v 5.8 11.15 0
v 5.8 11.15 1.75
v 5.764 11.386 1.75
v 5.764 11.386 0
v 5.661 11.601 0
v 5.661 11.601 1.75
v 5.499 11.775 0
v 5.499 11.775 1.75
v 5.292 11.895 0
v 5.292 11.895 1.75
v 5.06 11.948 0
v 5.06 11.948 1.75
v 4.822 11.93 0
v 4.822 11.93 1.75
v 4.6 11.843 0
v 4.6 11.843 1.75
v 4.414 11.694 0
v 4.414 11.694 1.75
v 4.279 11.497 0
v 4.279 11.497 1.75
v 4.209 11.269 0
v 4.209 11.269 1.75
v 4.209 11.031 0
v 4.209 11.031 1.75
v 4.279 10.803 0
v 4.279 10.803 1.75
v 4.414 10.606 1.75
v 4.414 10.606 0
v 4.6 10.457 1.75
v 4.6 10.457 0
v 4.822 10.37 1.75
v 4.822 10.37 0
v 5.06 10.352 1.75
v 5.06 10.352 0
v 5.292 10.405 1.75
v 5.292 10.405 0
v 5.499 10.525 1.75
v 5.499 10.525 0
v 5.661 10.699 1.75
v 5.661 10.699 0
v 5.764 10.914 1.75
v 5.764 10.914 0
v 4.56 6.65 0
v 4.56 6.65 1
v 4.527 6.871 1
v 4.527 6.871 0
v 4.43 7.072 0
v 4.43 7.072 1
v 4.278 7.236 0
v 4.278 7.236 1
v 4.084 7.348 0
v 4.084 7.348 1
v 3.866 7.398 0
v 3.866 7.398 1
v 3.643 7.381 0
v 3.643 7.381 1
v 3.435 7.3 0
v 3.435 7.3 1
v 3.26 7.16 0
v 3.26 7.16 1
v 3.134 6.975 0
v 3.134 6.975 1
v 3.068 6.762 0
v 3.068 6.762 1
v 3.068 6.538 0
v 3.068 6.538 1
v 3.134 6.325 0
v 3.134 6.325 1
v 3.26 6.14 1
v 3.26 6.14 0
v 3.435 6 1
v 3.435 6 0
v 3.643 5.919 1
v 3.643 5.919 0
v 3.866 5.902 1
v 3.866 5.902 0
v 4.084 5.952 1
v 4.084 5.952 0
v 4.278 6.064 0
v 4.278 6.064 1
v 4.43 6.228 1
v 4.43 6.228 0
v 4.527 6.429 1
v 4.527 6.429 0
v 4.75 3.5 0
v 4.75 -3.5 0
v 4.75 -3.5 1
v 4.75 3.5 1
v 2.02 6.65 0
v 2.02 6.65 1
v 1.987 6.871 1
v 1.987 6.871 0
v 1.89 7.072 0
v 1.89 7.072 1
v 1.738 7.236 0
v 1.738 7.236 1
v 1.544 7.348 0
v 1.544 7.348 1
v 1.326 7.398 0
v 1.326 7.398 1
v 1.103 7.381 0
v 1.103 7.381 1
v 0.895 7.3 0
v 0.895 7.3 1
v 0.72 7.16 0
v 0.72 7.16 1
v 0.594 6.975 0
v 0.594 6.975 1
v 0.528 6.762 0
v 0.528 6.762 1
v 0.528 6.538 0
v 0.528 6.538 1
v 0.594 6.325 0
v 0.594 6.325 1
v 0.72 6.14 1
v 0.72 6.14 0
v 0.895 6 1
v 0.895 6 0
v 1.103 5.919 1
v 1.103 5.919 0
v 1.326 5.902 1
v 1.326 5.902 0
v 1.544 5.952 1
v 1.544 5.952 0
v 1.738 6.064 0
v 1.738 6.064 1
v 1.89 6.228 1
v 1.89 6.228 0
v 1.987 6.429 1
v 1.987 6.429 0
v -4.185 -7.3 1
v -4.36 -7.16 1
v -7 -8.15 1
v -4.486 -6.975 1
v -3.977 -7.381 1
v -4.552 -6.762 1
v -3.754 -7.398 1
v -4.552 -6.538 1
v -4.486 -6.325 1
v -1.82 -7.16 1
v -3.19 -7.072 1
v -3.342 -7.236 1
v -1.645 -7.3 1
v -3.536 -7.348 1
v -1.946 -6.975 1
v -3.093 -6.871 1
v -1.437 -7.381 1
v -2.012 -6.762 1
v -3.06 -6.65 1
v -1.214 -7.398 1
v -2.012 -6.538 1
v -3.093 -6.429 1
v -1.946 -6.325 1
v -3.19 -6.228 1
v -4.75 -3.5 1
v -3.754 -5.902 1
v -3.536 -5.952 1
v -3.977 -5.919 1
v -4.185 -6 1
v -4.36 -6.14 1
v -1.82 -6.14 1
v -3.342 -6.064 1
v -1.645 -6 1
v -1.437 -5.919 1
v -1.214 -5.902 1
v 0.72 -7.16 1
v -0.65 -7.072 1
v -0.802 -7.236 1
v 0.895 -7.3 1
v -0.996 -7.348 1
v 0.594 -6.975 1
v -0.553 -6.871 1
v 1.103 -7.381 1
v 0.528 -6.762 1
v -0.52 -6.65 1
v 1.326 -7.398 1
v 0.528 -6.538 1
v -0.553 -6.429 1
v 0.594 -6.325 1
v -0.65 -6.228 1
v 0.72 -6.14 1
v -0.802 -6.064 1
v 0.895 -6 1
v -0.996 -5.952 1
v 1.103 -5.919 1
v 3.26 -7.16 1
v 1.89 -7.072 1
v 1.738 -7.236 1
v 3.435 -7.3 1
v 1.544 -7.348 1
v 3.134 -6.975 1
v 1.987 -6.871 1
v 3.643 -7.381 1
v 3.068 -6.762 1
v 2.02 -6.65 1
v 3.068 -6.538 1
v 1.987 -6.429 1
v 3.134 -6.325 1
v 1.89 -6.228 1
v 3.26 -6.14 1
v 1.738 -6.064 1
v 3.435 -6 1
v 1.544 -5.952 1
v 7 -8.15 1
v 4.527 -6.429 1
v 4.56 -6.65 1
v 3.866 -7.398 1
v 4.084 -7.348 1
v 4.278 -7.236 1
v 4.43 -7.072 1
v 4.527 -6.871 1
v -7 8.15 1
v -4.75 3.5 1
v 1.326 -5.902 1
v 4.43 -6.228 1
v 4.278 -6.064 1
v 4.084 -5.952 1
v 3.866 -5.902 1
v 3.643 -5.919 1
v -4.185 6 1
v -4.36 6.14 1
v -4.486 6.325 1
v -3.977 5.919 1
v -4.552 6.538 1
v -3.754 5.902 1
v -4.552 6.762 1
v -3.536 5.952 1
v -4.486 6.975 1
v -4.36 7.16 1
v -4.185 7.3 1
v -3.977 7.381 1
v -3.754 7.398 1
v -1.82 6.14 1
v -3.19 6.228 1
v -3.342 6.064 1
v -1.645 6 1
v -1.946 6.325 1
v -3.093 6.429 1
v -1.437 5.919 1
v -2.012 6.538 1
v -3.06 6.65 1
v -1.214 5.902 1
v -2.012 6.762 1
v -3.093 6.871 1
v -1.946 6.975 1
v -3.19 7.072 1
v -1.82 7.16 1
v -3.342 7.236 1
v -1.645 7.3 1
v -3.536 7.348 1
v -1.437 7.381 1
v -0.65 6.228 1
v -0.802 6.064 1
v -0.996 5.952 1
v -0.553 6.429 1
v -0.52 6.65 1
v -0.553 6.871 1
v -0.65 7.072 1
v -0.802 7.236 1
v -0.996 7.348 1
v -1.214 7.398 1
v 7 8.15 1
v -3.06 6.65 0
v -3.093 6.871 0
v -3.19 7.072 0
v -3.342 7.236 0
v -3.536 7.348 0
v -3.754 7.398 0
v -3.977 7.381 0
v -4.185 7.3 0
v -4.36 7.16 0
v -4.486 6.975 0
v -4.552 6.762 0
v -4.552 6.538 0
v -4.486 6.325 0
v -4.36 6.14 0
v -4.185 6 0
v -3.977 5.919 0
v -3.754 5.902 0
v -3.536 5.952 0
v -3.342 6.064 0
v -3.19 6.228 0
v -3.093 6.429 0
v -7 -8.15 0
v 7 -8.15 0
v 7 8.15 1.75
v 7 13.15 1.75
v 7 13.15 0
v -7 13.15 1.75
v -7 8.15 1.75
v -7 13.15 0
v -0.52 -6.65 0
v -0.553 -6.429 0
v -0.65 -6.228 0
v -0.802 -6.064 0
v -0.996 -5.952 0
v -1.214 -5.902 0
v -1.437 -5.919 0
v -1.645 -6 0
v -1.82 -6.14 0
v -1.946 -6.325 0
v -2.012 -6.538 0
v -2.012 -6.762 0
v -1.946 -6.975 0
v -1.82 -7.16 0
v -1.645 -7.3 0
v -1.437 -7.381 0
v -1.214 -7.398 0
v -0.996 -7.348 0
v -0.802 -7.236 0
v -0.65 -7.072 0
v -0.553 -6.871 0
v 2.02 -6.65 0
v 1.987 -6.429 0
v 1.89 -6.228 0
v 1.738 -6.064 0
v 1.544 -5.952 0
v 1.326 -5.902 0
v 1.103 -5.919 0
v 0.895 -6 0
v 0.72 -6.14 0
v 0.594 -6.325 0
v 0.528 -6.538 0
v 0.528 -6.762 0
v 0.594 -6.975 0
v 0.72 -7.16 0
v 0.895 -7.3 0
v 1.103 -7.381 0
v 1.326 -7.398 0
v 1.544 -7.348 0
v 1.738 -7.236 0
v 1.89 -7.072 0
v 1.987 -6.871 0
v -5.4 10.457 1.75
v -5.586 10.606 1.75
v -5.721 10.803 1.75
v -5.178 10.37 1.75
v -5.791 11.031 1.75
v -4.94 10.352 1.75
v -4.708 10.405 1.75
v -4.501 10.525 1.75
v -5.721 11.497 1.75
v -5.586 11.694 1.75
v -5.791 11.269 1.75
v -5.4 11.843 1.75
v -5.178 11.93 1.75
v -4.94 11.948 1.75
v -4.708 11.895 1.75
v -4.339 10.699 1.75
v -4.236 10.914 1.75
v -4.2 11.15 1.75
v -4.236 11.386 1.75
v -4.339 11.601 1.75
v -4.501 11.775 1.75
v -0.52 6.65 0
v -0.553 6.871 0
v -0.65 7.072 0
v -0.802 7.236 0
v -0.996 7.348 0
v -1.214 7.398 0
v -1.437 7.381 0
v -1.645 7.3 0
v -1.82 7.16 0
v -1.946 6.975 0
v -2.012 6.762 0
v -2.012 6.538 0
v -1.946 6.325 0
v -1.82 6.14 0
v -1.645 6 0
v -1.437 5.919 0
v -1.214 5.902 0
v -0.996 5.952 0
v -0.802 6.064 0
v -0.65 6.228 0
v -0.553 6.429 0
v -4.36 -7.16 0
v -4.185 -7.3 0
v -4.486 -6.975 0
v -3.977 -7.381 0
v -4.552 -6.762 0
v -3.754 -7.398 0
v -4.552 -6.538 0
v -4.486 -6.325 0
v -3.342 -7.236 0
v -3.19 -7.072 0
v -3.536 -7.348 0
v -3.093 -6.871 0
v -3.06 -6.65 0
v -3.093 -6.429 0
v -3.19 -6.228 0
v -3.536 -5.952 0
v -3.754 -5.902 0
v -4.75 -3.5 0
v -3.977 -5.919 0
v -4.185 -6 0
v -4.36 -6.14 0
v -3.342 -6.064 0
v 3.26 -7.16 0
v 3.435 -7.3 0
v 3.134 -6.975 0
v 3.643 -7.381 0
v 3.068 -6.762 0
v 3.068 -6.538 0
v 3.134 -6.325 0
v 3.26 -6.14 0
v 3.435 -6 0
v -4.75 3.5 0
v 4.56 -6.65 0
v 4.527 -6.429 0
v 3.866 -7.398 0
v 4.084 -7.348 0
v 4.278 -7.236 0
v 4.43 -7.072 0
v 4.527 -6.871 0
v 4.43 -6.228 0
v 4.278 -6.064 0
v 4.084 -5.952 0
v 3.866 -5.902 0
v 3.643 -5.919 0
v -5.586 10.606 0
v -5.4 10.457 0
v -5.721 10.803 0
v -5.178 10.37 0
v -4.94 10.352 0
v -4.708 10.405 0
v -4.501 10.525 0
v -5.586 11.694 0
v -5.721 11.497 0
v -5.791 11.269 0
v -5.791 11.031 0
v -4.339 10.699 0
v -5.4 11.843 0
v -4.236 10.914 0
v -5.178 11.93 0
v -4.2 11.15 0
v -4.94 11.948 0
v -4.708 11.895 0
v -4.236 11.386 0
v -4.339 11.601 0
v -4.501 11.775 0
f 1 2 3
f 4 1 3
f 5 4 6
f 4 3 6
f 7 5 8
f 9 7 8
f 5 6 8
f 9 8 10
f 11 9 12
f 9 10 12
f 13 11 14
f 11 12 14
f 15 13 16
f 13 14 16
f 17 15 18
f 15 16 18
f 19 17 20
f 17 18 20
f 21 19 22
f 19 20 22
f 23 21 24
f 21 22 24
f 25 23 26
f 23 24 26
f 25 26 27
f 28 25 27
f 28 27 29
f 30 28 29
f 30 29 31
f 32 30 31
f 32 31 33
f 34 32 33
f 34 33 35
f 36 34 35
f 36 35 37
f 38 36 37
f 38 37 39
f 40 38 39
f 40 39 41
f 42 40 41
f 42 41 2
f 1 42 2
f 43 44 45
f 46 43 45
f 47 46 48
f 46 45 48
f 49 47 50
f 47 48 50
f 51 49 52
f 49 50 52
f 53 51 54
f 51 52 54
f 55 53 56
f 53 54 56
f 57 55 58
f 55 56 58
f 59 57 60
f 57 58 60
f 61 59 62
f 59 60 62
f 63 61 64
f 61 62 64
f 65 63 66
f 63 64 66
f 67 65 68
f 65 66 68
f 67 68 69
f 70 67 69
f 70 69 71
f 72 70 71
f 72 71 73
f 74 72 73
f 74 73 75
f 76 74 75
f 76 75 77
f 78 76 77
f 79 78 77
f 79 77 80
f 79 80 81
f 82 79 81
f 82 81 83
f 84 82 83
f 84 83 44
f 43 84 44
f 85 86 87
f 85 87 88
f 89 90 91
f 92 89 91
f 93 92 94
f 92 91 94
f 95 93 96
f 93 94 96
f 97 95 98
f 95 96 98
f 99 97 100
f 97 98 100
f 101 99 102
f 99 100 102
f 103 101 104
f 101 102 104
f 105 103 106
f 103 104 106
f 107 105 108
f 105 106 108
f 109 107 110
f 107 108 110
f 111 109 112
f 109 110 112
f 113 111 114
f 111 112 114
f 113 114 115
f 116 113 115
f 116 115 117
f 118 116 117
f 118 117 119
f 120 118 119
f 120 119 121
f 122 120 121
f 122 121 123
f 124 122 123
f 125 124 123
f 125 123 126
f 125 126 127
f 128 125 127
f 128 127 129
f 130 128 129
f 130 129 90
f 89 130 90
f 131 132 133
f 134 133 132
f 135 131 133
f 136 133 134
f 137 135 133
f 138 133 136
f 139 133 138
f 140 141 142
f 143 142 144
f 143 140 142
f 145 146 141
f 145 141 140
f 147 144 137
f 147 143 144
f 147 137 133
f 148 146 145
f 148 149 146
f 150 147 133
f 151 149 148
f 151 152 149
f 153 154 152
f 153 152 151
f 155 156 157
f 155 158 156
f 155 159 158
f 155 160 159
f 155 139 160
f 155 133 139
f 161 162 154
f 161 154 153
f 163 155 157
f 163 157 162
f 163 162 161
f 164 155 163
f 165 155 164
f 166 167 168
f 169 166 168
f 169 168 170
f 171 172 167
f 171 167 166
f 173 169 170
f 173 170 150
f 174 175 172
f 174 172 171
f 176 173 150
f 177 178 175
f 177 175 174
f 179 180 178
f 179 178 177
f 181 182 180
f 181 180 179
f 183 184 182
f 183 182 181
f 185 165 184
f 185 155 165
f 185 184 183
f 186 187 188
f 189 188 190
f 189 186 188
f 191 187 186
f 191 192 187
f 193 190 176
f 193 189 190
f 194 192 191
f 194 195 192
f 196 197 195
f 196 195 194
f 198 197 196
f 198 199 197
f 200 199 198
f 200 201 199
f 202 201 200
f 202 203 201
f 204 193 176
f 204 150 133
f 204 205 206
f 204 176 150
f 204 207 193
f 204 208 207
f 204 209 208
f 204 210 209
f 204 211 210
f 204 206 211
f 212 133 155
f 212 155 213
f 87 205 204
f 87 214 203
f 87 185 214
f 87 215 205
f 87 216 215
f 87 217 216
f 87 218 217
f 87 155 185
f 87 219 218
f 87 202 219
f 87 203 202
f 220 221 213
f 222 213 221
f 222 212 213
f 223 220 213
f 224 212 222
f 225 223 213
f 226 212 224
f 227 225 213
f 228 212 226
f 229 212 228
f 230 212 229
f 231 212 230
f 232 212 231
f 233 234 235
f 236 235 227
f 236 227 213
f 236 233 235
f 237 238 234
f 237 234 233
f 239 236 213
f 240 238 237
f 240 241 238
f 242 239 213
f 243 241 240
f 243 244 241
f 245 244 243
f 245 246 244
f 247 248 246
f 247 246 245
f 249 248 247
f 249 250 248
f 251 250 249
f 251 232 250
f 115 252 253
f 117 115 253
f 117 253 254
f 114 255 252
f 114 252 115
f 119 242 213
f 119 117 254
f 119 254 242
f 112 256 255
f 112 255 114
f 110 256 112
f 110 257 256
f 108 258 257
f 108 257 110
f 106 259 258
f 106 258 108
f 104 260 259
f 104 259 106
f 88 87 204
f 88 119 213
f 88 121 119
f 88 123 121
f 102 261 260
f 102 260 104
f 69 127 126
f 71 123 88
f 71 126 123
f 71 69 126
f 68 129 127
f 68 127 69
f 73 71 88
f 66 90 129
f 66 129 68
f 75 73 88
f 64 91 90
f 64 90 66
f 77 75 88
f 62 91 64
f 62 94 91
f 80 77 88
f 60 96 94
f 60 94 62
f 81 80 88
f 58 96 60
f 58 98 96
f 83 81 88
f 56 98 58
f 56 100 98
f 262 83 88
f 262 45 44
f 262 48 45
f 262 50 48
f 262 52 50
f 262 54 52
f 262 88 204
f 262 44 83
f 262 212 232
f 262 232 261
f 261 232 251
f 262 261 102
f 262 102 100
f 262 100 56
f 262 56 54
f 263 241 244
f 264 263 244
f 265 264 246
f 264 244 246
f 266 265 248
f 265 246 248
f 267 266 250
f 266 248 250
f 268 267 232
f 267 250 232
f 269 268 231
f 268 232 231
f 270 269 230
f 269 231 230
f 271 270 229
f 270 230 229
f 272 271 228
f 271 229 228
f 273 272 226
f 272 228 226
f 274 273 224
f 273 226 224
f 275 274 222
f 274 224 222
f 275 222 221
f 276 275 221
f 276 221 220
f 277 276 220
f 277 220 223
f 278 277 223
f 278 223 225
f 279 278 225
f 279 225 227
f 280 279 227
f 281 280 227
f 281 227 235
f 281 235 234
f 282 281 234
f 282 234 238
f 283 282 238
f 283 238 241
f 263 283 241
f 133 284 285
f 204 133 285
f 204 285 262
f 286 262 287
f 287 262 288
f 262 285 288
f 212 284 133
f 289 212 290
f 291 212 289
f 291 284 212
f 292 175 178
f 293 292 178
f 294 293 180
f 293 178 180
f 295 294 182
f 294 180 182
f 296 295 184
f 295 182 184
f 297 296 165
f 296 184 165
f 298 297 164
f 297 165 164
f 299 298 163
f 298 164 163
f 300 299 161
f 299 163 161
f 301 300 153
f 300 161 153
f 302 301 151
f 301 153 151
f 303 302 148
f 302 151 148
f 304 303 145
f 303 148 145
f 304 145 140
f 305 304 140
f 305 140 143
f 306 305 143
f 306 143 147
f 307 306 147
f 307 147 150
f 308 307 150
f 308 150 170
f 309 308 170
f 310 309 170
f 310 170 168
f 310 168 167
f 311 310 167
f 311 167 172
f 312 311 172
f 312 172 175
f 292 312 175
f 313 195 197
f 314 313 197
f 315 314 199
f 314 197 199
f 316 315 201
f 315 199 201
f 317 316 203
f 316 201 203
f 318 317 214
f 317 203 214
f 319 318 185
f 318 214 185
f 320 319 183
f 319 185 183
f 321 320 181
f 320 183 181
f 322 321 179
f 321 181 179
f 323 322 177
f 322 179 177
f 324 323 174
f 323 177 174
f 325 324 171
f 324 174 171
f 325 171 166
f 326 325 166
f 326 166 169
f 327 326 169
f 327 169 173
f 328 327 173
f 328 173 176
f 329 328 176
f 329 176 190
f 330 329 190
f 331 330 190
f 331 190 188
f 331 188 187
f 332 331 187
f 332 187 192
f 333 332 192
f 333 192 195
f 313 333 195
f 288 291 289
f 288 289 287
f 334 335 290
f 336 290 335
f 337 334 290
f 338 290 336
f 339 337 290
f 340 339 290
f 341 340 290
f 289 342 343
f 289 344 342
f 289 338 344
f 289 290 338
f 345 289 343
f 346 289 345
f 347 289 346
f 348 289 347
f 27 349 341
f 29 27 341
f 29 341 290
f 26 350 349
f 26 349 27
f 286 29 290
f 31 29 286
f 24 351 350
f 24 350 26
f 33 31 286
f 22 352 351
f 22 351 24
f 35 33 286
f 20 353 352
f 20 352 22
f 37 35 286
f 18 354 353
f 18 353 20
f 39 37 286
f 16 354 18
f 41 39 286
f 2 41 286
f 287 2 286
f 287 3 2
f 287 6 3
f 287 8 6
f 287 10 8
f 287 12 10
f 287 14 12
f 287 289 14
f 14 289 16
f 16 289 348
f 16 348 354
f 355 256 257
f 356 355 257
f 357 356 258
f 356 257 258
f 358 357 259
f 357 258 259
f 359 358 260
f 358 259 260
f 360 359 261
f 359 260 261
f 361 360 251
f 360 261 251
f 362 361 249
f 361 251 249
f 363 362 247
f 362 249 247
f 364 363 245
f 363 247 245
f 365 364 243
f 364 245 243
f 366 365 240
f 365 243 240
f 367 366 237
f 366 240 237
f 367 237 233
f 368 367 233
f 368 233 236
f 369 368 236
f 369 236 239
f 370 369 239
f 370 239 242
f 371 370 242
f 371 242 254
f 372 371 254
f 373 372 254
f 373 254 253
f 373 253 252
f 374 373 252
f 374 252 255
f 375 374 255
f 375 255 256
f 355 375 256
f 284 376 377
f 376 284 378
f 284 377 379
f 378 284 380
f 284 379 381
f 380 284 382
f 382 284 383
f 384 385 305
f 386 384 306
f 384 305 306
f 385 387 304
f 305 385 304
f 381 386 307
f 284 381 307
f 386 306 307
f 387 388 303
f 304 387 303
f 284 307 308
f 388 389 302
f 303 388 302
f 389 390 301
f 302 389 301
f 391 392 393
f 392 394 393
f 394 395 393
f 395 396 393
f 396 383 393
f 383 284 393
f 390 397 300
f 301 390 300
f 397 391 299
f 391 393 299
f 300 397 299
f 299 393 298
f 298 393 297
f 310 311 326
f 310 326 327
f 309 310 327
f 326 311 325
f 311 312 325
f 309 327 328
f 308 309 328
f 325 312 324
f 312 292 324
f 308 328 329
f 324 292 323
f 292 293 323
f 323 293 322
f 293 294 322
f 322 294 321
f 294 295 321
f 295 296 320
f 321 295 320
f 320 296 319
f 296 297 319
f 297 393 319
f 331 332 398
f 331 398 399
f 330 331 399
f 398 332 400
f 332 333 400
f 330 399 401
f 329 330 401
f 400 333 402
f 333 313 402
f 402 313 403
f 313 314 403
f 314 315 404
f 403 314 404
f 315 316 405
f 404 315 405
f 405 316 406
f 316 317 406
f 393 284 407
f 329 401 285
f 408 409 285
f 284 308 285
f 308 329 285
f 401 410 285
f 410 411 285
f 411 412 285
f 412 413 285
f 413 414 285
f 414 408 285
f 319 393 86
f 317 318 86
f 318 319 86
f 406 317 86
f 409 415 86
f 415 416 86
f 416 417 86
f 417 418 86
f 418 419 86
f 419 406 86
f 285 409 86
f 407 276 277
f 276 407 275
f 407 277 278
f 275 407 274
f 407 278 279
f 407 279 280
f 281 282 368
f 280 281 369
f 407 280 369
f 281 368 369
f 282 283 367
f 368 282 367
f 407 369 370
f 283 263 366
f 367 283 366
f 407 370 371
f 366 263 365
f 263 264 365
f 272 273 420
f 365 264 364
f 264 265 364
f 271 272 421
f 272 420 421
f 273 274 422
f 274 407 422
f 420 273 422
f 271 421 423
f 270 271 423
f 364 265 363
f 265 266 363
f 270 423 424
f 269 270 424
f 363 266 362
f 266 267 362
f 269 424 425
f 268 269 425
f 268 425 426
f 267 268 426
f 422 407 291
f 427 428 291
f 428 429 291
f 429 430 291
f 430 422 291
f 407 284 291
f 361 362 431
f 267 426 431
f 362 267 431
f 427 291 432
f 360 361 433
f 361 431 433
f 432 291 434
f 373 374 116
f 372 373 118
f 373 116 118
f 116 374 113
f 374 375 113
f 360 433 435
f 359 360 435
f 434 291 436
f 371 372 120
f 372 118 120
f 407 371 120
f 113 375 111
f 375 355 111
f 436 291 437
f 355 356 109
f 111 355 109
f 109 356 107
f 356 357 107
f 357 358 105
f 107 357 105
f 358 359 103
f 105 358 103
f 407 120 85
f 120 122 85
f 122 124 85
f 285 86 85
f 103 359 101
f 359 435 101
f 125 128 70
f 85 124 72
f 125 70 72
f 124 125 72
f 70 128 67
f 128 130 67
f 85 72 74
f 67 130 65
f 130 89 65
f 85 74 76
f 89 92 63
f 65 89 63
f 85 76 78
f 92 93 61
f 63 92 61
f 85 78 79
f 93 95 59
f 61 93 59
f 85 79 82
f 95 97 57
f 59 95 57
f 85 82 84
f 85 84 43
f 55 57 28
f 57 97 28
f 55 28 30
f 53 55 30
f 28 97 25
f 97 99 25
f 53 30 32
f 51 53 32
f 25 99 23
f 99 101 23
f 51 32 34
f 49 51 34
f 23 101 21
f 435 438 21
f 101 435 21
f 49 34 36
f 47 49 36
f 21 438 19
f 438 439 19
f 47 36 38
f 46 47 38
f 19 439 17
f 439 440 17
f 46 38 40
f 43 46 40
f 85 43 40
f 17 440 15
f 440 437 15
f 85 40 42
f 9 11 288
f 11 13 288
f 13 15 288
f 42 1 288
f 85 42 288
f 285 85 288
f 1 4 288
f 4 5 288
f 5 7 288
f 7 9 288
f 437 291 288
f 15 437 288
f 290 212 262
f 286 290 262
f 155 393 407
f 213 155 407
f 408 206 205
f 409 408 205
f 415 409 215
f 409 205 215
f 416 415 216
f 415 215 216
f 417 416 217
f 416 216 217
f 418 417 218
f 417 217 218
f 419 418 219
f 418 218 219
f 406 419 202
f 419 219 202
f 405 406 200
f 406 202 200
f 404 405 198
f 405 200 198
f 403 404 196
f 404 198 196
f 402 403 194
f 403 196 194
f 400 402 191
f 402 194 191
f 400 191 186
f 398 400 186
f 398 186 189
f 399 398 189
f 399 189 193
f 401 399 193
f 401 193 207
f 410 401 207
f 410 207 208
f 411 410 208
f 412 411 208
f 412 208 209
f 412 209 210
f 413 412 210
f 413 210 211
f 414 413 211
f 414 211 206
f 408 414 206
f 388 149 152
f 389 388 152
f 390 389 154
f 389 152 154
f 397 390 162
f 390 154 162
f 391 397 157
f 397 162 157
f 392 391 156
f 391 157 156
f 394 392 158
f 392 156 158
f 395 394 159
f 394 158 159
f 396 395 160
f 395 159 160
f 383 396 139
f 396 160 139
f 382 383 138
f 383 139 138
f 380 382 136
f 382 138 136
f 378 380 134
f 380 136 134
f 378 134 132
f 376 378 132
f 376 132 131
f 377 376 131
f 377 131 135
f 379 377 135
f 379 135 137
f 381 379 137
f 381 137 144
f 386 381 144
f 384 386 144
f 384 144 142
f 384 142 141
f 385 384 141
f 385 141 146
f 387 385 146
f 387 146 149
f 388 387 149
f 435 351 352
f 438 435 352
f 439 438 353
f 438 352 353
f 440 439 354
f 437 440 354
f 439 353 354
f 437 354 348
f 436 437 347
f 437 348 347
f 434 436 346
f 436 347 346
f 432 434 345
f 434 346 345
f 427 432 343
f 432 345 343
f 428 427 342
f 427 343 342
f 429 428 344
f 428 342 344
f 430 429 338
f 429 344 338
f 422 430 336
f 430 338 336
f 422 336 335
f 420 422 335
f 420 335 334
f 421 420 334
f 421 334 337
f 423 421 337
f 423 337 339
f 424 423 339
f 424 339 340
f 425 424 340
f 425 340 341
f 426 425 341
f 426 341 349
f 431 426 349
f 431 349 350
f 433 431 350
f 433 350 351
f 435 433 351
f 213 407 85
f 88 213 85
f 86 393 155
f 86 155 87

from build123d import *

# Parameters (mm, degrees)
SKETCH1_W                   = 14
SKETCH1_H                   = 16.3
SKETCH1_W_2                 = 10
SKETCH1_H_2                 = 13.3
SKETCH1_W_3                 = 9.5
SKETCH1_H_3                 = 7
CAP_EXTRUDE_DEPTH           = 1
SKETCH1_7_W                 = 14
SKETCH1_7_H                 = 5
FLAP_EXTRUDE_DEPTH          = 1.75
CUT_EXTRUDE2_REACH          = 3.75
SKETCH1_9_W                 = 9.5
SKETCH1_9_H                 = 7
F_1_5MM_DOWEL_HOLE1_D       = 1.5
F_1_5MM_DOWEL_HOLE1_DEPTH   = 1
TAP_DRILL_FOR_M2_TAP1_D     = 1.6
TAP_DRILL_FOR_M2_TAP1_DEPTH = 1.75


with BuildPart() as part:
    # Sketch1 → cap_extrude (new body)
    with BuildSketch(Plane.XY):
        Rectangle(SKETCH1_W, SKETCH1_H)
        Rectangle(SKETCH1_W_2, SKETCH1_H_2, mode=Mode.SUBTRACT)
        Rectangle(SKETCH1_W_2, SKETCH1_H_2)
        Rectangle(SKETCH1_W_3, SKETCH1_H_3, mode=Mode.SUBTRACT)
        Rectangle(SKETCH1_W_3, SKETCH1_H_3)
    extrude(amount=CAP_EXTRUDE_DEPTH)

    # Sketch1<7> → flap_extrude (add)
    with BuildSketch(Plane.XY):
        with Locations((0, 10.65)):
            Rectangle(SKETCH1_7_W, SKETCH1_7_H)
    extrude(amount=FLAP_EXTRUDE_DEPTH)

    # Sketch1<9> → Cut-Extrude2 (cut, up to next)
    with BuildSketch(Plane.XY, mode=Mode.PRIVATE) as cut_extrude2_sk1:
        Rectangle(SKETCH1_9_W, SKETCH1_9_H)
    cut_extrude2_tool1 = extrude(cut_extrude2_sk1.sketch, amount=CUT_EXTRUDE2_REACH, mode=Mode.PRIVATE) & part.part
    add(cut_extrude2_tool1.solids().sort_by_distance((0, 0, 0))[0], mode=Mode.SUBTRACT)

    # Ø1.5mm Dowel Hole1
    with Locations(Plane(origin=(0, 0, 0), x_dir=(-1, 0, 0), z_dir=(0, 0, -1))):
        with Locations((3.81, 6.65), (1.27, 6.65), (-1.27, 6.65), (-3.81, 6.65), (-3.81, -6.65), (-1.27, -6.65), (1.27, -6.65), (3.81, -6.65)):
            Hole(F_1_5MM_DOWEL_HOLE1_D / 2, depth=F_1_5MM_DOWEL_HOLE1_DEPTH)

    # Tap Drill for M2 Tap1
    with Locations(Plane(origin=(0, 0, 0), x_dir=(-1, 0, 0), z_dir=(0, 0, -1))):
        with Locations((-5, 11.15), (5, 11.15)):
            Hole(TAP_DRILL_FOR_M2_TAP1_D / 2, depth=TAP_DRILL_FOR_M2_TAP1_DEPTH)


solid = part.part
